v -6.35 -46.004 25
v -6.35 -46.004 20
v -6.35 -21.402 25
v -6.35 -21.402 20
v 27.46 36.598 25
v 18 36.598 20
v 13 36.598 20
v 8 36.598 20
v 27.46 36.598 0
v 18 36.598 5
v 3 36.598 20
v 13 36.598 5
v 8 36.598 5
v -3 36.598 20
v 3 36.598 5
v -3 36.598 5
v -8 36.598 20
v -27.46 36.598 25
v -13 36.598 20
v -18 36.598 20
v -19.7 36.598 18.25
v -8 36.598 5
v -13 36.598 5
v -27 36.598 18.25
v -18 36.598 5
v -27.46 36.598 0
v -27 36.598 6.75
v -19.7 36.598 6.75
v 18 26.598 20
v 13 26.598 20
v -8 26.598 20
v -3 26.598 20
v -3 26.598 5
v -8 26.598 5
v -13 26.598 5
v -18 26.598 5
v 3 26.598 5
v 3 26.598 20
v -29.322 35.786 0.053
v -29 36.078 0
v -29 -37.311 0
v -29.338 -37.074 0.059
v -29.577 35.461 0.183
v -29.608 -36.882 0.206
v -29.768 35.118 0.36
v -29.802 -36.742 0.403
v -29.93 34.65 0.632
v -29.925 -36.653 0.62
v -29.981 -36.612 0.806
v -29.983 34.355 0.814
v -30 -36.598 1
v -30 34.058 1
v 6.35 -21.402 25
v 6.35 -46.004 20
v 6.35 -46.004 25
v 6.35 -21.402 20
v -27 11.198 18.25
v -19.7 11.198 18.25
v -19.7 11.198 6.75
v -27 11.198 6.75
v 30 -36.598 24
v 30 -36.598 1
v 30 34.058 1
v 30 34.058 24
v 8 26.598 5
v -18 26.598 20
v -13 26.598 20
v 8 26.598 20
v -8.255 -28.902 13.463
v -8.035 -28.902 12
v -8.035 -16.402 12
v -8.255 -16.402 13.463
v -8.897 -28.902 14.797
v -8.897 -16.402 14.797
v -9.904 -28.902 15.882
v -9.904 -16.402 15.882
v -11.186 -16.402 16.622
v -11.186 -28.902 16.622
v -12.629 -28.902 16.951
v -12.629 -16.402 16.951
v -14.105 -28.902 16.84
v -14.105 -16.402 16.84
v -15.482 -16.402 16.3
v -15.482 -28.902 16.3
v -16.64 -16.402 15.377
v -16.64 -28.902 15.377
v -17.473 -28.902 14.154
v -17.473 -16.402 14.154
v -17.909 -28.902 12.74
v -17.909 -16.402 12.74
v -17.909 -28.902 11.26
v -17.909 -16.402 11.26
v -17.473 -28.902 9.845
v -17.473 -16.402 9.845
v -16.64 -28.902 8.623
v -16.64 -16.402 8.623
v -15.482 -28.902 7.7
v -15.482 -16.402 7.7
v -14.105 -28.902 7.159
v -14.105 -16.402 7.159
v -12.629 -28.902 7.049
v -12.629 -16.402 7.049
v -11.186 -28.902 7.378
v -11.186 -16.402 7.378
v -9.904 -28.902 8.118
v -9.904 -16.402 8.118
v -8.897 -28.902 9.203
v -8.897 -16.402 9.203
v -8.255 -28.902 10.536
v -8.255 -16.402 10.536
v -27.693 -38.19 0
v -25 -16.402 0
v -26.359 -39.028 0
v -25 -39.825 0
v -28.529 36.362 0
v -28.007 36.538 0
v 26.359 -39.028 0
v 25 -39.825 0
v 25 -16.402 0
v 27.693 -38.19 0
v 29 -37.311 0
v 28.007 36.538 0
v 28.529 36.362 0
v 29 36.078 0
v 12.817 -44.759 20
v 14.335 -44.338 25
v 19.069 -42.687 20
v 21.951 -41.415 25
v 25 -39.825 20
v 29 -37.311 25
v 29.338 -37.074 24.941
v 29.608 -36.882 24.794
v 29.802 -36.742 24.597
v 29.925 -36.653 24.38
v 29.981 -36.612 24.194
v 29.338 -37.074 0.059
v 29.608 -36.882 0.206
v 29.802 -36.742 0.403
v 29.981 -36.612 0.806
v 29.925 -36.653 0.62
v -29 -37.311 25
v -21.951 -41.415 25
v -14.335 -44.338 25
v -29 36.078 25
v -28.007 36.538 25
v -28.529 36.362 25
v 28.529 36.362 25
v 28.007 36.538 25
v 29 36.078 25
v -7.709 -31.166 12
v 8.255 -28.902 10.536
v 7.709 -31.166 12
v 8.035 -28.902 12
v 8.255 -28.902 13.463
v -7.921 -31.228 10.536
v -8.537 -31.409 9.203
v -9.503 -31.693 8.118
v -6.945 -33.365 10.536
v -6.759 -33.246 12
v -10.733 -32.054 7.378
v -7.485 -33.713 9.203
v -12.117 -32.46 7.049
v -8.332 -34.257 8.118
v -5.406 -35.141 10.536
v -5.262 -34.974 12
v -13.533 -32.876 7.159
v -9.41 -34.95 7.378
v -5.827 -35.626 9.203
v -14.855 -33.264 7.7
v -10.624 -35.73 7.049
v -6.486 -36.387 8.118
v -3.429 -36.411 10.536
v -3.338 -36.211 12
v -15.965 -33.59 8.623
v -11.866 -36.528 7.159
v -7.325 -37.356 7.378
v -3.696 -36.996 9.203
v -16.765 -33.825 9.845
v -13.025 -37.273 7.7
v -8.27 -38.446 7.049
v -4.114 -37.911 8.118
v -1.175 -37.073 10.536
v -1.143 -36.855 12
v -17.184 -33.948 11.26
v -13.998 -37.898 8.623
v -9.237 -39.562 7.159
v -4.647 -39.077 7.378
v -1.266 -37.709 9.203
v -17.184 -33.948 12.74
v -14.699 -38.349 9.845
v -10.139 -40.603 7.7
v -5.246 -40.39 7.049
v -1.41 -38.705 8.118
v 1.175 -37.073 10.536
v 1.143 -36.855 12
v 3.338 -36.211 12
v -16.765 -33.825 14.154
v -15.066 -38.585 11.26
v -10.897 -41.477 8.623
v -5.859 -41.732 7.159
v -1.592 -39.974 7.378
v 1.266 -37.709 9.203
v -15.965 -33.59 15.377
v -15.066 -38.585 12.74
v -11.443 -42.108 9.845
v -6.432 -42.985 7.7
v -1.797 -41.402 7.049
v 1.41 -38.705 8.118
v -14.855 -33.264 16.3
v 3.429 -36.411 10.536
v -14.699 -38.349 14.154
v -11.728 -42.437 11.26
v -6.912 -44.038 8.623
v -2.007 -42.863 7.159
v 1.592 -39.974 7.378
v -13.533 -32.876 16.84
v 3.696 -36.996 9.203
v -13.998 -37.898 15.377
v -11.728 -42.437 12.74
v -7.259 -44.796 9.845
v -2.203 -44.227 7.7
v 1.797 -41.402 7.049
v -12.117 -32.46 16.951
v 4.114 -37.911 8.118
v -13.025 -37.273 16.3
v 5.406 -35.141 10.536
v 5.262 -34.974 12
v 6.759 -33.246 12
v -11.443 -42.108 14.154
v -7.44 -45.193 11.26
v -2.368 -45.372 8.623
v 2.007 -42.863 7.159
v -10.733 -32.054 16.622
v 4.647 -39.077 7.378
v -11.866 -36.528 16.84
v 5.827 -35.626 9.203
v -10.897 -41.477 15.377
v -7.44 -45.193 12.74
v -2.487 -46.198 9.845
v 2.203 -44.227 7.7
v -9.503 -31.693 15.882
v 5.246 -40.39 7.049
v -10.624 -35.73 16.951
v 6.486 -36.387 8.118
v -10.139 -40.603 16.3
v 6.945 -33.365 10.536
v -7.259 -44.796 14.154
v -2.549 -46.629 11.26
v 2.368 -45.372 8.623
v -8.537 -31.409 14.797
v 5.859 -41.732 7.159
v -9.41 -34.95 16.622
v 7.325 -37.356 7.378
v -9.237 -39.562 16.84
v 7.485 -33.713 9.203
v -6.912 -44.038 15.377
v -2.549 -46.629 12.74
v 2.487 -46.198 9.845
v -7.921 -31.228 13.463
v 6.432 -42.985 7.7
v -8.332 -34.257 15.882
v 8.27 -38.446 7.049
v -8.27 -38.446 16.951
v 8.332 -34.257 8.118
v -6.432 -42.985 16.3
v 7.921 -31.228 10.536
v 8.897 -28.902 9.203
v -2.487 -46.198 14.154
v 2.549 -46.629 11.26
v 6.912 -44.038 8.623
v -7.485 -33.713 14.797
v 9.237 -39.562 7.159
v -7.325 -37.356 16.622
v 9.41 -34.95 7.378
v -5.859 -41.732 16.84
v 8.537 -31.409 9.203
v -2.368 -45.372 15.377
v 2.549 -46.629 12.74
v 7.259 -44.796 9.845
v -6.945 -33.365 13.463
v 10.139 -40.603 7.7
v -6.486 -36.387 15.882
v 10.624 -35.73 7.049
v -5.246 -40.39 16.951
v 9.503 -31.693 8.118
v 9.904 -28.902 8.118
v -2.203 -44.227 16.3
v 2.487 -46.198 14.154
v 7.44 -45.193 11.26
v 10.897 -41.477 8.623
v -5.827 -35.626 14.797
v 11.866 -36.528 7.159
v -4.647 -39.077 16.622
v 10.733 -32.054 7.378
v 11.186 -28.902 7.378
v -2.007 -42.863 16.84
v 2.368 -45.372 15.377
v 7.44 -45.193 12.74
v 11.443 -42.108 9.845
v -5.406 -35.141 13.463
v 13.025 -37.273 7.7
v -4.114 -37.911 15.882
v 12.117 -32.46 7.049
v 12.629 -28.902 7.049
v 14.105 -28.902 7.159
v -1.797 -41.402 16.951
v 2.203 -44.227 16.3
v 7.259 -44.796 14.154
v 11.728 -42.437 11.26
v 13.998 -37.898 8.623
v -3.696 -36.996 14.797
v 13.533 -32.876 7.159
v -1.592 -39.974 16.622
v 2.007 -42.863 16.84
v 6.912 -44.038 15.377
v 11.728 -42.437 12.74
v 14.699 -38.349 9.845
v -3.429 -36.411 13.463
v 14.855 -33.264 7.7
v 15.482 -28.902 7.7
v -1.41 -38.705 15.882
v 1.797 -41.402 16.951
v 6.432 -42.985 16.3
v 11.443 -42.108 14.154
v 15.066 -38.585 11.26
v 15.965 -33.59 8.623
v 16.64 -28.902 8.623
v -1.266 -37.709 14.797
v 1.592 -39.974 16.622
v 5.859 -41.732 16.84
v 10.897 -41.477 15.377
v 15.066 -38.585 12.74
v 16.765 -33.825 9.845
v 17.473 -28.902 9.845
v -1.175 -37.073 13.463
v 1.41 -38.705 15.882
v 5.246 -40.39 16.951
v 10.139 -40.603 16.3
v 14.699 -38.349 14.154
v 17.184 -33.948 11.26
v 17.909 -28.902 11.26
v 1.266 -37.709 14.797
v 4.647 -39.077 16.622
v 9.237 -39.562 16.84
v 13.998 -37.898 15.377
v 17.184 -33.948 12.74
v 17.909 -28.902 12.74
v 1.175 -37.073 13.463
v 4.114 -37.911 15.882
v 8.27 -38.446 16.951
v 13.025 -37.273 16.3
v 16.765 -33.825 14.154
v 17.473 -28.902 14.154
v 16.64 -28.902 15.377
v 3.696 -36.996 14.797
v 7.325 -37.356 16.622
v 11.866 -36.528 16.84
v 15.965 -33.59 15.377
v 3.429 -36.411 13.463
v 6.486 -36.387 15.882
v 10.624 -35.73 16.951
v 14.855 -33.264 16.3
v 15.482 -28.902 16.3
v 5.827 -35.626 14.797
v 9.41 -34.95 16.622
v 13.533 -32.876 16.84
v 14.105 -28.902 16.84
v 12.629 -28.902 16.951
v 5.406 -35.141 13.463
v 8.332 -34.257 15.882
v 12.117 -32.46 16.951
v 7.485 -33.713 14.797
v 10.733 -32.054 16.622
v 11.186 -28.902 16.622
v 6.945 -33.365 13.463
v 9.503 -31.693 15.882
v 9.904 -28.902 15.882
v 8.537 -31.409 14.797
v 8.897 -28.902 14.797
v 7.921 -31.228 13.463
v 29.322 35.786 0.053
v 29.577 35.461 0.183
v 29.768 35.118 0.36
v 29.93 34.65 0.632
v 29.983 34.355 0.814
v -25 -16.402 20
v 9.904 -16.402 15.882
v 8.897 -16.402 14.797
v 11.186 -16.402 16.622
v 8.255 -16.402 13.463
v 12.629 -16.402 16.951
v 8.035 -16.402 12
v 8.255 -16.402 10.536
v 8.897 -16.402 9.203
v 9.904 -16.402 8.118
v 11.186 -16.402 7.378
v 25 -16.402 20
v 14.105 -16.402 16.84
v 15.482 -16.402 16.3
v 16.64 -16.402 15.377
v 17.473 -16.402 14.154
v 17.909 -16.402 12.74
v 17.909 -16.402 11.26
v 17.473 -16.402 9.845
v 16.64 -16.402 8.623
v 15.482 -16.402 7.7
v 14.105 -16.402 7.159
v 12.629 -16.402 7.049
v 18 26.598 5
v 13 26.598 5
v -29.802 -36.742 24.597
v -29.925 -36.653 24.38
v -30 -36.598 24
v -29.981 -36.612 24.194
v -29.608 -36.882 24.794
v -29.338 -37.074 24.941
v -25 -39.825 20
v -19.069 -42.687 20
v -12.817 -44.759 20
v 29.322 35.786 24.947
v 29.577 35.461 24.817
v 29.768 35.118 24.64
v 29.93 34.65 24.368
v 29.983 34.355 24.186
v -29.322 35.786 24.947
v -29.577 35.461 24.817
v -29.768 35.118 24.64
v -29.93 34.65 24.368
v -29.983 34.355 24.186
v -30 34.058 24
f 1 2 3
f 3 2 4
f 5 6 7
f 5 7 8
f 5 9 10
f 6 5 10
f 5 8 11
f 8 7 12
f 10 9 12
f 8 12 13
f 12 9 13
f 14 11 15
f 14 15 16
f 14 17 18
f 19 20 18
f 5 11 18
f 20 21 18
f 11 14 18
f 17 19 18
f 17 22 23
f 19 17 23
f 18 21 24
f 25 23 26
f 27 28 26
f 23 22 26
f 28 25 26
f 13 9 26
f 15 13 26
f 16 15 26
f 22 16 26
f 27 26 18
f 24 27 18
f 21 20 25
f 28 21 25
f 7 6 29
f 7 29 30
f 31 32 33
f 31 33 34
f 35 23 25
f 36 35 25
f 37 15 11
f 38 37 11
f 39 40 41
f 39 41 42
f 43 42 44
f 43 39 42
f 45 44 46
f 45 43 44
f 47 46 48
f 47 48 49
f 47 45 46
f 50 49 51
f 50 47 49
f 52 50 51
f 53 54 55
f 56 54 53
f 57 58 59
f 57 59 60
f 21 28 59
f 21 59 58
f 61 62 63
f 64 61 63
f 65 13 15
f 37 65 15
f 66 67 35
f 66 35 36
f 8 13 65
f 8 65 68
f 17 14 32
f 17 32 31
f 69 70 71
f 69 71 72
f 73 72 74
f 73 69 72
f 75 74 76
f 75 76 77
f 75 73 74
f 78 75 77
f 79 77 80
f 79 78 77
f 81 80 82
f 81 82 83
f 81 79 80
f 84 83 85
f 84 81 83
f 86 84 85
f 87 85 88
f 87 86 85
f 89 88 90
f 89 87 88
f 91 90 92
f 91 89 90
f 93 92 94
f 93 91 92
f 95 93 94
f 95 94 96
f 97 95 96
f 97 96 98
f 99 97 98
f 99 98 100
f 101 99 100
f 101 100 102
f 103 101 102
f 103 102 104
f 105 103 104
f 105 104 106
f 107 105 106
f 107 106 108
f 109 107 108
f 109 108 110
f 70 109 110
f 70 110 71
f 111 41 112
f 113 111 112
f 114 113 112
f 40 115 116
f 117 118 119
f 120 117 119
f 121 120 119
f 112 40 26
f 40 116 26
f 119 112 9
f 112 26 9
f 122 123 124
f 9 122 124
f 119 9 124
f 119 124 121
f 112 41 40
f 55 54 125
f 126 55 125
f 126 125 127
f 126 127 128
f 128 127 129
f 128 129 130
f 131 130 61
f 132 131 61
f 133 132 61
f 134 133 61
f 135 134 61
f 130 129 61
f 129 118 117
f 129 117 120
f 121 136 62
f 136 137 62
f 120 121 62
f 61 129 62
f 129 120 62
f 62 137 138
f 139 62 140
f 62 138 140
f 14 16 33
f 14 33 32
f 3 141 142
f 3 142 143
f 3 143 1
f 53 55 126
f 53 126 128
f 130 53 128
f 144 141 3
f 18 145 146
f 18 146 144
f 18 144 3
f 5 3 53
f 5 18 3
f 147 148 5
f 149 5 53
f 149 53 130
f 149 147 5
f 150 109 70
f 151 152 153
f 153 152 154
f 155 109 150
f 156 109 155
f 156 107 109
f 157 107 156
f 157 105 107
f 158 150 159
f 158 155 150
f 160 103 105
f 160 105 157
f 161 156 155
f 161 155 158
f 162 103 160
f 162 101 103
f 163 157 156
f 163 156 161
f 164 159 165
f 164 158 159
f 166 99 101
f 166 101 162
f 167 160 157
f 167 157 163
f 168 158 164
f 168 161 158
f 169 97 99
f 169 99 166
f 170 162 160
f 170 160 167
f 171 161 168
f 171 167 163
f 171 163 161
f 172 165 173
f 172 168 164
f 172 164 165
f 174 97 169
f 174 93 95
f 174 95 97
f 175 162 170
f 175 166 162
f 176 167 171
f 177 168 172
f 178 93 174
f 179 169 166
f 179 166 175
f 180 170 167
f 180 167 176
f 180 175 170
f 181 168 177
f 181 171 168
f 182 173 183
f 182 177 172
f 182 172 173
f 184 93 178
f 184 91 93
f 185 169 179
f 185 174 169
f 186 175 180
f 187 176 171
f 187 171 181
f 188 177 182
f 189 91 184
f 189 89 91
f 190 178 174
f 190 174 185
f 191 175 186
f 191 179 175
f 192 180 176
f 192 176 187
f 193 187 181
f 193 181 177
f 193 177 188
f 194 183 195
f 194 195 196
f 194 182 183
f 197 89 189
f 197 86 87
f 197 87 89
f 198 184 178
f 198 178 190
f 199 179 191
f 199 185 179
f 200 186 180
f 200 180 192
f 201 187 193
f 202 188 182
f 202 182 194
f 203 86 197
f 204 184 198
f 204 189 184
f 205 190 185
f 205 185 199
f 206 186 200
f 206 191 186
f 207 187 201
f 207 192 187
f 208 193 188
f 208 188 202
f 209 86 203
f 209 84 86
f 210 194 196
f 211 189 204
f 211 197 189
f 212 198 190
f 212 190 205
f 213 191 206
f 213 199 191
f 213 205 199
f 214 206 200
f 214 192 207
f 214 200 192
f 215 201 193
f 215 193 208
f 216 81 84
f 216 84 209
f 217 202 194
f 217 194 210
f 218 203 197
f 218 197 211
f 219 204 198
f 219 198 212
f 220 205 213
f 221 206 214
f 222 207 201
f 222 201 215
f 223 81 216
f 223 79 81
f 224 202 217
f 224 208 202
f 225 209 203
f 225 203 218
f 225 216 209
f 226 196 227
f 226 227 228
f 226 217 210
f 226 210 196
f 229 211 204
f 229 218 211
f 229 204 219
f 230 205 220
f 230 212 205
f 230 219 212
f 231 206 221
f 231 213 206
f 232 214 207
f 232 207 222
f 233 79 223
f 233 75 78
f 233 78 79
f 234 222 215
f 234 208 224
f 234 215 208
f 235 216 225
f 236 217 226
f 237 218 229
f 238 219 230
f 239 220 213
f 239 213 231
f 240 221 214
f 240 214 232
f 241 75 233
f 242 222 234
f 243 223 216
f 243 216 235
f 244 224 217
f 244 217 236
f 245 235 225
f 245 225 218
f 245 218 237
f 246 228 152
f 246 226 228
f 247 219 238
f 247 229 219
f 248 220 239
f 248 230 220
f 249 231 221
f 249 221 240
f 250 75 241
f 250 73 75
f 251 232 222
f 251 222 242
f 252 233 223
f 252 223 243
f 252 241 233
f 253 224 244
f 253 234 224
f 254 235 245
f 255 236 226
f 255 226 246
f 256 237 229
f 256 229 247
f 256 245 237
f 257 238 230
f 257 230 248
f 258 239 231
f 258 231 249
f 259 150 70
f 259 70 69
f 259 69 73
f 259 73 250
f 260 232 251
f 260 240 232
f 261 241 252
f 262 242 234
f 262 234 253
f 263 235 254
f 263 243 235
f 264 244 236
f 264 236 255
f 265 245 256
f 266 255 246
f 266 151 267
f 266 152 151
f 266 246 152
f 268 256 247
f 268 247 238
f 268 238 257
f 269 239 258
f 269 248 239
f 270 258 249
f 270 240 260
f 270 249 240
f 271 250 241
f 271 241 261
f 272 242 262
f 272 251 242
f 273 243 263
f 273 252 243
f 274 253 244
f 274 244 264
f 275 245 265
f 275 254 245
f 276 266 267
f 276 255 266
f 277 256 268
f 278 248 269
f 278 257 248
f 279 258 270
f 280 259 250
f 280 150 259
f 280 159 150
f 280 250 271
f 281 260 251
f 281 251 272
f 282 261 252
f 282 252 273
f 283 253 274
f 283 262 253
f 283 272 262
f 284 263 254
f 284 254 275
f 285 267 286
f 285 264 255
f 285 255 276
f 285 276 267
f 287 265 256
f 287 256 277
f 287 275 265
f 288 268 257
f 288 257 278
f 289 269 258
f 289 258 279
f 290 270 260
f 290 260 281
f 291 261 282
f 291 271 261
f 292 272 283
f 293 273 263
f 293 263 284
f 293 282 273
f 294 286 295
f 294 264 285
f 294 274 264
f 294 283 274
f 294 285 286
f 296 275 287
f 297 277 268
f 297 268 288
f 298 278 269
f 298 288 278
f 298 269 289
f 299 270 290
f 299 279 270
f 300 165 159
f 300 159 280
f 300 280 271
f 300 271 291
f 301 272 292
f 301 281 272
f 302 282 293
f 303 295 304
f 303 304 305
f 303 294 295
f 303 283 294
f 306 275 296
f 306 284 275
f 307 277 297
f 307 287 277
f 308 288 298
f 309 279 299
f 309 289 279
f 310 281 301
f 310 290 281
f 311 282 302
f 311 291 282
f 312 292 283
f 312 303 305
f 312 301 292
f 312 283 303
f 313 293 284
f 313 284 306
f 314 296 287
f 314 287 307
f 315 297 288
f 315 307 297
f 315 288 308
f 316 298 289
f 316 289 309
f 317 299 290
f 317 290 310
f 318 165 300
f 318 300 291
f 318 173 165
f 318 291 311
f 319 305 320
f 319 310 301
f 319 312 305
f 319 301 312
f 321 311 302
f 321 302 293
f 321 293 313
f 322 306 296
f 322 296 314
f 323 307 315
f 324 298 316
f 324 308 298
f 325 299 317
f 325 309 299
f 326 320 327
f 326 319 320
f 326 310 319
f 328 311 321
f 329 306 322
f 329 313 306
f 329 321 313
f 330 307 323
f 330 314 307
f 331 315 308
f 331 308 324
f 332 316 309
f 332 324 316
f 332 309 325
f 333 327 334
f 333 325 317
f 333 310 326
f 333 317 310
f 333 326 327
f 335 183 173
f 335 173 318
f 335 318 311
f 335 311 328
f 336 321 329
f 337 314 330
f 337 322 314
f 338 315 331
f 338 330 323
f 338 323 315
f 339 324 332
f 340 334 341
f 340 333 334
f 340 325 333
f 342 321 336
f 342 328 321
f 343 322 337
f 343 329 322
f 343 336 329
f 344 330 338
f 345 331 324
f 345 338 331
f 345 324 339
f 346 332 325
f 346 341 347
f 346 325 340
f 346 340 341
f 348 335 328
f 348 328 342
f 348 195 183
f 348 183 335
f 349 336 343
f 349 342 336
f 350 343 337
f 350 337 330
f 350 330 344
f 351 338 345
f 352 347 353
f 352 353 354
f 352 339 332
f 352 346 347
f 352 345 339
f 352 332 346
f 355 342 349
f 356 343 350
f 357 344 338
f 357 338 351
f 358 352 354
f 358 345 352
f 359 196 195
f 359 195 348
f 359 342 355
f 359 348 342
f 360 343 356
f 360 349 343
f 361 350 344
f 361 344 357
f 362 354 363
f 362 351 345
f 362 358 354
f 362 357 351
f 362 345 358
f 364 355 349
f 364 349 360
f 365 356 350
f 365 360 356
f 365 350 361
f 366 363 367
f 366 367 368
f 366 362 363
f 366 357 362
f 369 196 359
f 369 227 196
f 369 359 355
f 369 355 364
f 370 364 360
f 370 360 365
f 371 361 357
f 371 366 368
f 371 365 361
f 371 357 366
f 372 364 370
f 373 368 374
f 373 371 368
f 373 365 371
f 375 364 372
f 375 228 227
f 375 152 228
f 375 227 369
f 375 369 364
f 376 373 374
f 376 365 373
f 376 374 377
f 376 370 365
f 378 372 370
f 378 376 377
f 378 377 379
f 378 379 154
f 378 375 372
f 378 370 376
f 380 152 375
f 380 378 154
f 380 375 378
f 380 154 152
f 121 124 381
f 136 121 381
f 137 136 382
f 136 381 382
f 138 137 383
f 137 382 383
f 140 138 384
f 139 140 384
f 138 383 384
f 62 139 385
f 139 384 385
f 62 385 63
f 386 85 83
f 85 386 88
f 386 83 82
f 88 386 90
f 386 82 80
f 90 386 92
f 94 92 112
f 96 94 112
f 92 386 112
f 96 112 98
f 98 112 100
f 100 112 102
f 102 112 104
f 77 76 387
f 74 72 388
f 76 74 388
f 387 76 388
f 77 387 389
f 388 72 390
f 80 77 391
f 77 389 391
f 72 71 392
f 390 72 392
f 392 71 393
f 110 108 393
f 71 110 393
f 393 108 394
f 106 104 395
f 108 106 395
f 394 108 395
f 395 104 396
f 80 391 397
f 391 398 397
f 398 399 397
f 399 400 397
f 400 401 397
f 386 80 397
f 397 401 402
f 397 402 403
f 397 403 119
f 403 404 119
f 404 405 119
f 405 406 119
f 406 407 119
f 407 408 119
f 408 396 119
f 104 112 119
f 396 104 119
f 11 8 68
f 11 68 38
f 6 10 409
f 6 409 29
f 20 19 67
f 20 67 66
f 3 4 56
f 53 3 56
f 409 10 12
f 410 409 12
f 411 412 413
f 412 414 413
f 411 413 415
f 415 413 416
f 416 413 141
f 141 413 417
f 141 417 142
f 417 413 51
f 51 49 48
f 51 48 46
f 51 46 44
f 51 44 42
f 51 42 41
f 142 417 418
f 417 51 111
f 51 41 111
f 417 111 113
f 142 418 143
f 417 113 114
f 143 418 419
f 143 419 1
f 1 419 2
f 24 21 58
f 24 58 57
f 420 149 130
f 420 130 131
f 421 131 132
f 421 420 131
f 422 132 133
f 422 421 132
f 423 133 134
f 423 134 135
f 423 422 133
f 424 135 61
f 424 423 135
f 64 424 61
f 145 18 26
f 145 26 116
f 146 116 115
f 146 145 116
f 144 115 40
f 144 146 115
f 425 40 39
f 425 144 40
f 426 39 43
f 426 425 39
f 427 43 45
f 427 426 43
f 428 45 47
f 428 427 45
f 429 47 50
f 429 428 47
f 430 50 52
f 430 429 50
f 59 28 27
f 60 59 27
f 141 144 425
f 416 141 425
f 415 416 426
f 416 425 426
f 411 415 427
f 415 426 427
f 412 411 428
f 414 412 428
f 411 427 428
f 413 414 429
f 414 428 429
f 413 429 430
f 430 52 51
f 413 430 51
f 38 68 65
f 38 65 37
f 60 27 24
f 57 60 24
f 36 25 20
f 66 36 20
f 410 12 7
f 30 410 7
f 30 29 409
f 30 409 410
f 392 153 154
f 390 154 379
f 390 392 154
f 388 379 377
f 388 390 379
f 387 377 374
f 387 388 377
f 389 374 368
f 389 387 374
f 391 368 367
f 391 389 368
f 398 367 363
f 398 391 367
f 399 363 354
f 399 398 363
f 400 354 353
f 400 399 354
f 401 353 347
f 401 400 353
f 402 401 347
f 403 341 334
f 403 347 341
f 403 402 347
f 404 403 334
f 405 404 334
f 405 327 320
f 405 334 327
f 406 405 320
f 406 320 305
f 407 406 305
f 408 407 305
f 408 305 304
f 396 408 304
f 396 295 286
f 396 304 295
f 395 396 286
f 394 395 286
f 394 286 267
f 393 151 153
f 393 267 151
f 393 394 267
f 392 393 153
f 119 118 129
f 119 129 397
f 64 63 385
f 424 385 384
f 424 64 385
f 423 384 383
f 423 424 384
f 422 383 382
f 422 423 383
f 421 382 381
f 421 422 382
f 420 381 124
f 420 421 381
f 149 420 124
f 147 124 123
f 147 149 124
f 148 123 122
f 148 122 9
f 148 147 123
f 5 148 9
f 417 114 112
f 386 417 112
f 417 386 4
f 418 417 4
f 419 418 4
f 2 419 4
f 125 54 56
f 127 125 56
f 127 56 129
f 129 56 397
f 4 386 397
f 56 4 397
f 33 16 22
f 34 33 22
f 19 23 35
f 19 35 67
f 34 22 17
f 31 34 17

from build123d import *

# Parameters (mm, degrees)
F1_DEPTH    = 25
F3_R        = 2.54
F4_W        = 50
F4_H        = 30
F5_DEPTH    = 20
F2_W        = 12.7
F2_H        = 25
F6_DEPTH    = 25
F7_T1_DEPTH = 75.655609521
F9_W        = 5
F9_H        = 15
F10_DEPTH   = 10
F11_W       = 7.3
F11_H       = 11.5
F12_DEPTH   = 25.4
F15_R       = 4.9651178244


# Not quite as in the source:
# - a fillet or chamfer that OpenCascade refuses, or shapes differently, is made with other operations: its cross-section is extruded or revolved along the edge and cut away or added
# - a feature names something its author has since deleted; it is built from what else it names


with BuildPart() as f1:
    # F0 (on Top) → F1 (new body)
    with BuildSketch(Plane.XY):
        with BuildLine():
            Line((30, -36.5978047605), (30, 36.5978047605))
            Line((30, 36.5978047605), (-30, 36.5978047605))
            Line((-30, 36.5978047605), (-30, -36.5978047605))
            ThreePointArc((-30, -36.5978047605), (0, -46.4021952395), (30, -36.5978047605))
        make_face()
    extrude(amount=F1_DEPTH)

    # F3
    f3_edges = [f1.edges().sort_by_distance(p)[0] for p in [
        (-30, 36.597805, 12.5),
        (30, 36.597805, 12.5),
    ]]
    fillet(f3_edges, radius=F3_R)

    # F4 (on face) → F5 (cut)
    with BuildSketch(Plane.XY):
        with Locations((0, -31.4021952395)):
            Rectangle(F4_W, F4_H)
    extrude(amount=F5_DEPTH, mode=Mode.SUBTRACT)

    # F2 (on Top) → F6 (cut, through all)
    with BuildSketch(Plane.XY):
        with Locations((0, -33.9021952395)):
            Rectangle(F2_W, F2_H)
    extrude(amount=F6_DEPTH, mode=Mode.SUBTRACT)

    # F7: fillet of radius 1 on 4 edges, made by hand

    # F7_s2 → F7_t1 (cut)
    with BuildSketch(Plane.XZ.offset(-36.5578047605)):
        with BuildLine():
            ThreePointArc((29, 0), (29.7071067812, 0.2928932188), (30, 1))
            Line((30, 1), (30, 0))
            Line((30, 0), (29, 0))
        make_face()
        with BuildLine():
            ThreePointArc((29, 25), (29.7071067812, 24.7071067812), (30, 24))
            Line((30, 24), (30, 25))
            Line((30, 25), (29, 25))
        make_face()
        with BuildLine():
            ThreePointArc((-29, 25), (-29.7071067812, 24.7071067812), (-30, 24))
            Line((-30, 24), (-30, 25))
            Line((-30, 25), (-29, 25))
        make_face()
        with BuildLine():
            ThreePointArc((-29, 0), (-29.7071067812, 0.2928932188), (-30, 1))
            Line((-30, 1), (-30, 0))
            Line((-30, 0), (-29, 0))
        make_face()
    extrude(amount=F7_T1_DEPTH, mode=Mode.SUBTRACT)

    # F9 (on face) → F10 (cut)
    with BuildSketch(Plane(origin=(0, 36.5978047605, 0), x_dir=(-1, 0, 0), z_dir=(0, 1, 0))):
        with Locations((-15.5, 12.5)):
            Rectangle(F9_W, F9_H)
        with Locations((15.5, 12.5)):
            Rectangle(F9_W, F9_H)
        with Locations((-5.5, 12.5)):
            Rectangle(F9_W, F9_H)
        with Locations((5.5, 12.5)):
            Rectangle(F9_W, F9_H)
    extrude(amount=-F10_DEPTH, mode=Mode.SUBTRACT)

    # F11 (on face) → F12 (cut)
    with BuildSketch(Plane(origin=(0, 36.5978047605, 0), x_dir=(-1, 0, 0), z_dir=(0, 1, 0))):
        with Locations((23.35, 12.5)):
            Rectangle(F11_W, F11_H)
    extrude(amount=-F12_DEPTH, mode=Mode.SUBTRACT)

    # F16: sweep along a path in F14
    with BuildLine(Plane.XY.offset(12)) as f16_path:
        Line((-13, -16.4021952395), (-13, -28.9021952395))
        ThreePointArc((-13, -28.9021952395), (0, -41.9021952395), (13, -28.9021952395))
        Line((13, -28.9021952395), (13, -16.4021952395))
    # F15 (on face) → F16 (sweep)
    with BuildSketch(Plane.XZ.offset(16.4021952395)):
        with Locations((-12.9998130724, 11.9997570291)):
            Circle(F15_R)
    sweep(path=f16_path.line)


solid = f1.part
